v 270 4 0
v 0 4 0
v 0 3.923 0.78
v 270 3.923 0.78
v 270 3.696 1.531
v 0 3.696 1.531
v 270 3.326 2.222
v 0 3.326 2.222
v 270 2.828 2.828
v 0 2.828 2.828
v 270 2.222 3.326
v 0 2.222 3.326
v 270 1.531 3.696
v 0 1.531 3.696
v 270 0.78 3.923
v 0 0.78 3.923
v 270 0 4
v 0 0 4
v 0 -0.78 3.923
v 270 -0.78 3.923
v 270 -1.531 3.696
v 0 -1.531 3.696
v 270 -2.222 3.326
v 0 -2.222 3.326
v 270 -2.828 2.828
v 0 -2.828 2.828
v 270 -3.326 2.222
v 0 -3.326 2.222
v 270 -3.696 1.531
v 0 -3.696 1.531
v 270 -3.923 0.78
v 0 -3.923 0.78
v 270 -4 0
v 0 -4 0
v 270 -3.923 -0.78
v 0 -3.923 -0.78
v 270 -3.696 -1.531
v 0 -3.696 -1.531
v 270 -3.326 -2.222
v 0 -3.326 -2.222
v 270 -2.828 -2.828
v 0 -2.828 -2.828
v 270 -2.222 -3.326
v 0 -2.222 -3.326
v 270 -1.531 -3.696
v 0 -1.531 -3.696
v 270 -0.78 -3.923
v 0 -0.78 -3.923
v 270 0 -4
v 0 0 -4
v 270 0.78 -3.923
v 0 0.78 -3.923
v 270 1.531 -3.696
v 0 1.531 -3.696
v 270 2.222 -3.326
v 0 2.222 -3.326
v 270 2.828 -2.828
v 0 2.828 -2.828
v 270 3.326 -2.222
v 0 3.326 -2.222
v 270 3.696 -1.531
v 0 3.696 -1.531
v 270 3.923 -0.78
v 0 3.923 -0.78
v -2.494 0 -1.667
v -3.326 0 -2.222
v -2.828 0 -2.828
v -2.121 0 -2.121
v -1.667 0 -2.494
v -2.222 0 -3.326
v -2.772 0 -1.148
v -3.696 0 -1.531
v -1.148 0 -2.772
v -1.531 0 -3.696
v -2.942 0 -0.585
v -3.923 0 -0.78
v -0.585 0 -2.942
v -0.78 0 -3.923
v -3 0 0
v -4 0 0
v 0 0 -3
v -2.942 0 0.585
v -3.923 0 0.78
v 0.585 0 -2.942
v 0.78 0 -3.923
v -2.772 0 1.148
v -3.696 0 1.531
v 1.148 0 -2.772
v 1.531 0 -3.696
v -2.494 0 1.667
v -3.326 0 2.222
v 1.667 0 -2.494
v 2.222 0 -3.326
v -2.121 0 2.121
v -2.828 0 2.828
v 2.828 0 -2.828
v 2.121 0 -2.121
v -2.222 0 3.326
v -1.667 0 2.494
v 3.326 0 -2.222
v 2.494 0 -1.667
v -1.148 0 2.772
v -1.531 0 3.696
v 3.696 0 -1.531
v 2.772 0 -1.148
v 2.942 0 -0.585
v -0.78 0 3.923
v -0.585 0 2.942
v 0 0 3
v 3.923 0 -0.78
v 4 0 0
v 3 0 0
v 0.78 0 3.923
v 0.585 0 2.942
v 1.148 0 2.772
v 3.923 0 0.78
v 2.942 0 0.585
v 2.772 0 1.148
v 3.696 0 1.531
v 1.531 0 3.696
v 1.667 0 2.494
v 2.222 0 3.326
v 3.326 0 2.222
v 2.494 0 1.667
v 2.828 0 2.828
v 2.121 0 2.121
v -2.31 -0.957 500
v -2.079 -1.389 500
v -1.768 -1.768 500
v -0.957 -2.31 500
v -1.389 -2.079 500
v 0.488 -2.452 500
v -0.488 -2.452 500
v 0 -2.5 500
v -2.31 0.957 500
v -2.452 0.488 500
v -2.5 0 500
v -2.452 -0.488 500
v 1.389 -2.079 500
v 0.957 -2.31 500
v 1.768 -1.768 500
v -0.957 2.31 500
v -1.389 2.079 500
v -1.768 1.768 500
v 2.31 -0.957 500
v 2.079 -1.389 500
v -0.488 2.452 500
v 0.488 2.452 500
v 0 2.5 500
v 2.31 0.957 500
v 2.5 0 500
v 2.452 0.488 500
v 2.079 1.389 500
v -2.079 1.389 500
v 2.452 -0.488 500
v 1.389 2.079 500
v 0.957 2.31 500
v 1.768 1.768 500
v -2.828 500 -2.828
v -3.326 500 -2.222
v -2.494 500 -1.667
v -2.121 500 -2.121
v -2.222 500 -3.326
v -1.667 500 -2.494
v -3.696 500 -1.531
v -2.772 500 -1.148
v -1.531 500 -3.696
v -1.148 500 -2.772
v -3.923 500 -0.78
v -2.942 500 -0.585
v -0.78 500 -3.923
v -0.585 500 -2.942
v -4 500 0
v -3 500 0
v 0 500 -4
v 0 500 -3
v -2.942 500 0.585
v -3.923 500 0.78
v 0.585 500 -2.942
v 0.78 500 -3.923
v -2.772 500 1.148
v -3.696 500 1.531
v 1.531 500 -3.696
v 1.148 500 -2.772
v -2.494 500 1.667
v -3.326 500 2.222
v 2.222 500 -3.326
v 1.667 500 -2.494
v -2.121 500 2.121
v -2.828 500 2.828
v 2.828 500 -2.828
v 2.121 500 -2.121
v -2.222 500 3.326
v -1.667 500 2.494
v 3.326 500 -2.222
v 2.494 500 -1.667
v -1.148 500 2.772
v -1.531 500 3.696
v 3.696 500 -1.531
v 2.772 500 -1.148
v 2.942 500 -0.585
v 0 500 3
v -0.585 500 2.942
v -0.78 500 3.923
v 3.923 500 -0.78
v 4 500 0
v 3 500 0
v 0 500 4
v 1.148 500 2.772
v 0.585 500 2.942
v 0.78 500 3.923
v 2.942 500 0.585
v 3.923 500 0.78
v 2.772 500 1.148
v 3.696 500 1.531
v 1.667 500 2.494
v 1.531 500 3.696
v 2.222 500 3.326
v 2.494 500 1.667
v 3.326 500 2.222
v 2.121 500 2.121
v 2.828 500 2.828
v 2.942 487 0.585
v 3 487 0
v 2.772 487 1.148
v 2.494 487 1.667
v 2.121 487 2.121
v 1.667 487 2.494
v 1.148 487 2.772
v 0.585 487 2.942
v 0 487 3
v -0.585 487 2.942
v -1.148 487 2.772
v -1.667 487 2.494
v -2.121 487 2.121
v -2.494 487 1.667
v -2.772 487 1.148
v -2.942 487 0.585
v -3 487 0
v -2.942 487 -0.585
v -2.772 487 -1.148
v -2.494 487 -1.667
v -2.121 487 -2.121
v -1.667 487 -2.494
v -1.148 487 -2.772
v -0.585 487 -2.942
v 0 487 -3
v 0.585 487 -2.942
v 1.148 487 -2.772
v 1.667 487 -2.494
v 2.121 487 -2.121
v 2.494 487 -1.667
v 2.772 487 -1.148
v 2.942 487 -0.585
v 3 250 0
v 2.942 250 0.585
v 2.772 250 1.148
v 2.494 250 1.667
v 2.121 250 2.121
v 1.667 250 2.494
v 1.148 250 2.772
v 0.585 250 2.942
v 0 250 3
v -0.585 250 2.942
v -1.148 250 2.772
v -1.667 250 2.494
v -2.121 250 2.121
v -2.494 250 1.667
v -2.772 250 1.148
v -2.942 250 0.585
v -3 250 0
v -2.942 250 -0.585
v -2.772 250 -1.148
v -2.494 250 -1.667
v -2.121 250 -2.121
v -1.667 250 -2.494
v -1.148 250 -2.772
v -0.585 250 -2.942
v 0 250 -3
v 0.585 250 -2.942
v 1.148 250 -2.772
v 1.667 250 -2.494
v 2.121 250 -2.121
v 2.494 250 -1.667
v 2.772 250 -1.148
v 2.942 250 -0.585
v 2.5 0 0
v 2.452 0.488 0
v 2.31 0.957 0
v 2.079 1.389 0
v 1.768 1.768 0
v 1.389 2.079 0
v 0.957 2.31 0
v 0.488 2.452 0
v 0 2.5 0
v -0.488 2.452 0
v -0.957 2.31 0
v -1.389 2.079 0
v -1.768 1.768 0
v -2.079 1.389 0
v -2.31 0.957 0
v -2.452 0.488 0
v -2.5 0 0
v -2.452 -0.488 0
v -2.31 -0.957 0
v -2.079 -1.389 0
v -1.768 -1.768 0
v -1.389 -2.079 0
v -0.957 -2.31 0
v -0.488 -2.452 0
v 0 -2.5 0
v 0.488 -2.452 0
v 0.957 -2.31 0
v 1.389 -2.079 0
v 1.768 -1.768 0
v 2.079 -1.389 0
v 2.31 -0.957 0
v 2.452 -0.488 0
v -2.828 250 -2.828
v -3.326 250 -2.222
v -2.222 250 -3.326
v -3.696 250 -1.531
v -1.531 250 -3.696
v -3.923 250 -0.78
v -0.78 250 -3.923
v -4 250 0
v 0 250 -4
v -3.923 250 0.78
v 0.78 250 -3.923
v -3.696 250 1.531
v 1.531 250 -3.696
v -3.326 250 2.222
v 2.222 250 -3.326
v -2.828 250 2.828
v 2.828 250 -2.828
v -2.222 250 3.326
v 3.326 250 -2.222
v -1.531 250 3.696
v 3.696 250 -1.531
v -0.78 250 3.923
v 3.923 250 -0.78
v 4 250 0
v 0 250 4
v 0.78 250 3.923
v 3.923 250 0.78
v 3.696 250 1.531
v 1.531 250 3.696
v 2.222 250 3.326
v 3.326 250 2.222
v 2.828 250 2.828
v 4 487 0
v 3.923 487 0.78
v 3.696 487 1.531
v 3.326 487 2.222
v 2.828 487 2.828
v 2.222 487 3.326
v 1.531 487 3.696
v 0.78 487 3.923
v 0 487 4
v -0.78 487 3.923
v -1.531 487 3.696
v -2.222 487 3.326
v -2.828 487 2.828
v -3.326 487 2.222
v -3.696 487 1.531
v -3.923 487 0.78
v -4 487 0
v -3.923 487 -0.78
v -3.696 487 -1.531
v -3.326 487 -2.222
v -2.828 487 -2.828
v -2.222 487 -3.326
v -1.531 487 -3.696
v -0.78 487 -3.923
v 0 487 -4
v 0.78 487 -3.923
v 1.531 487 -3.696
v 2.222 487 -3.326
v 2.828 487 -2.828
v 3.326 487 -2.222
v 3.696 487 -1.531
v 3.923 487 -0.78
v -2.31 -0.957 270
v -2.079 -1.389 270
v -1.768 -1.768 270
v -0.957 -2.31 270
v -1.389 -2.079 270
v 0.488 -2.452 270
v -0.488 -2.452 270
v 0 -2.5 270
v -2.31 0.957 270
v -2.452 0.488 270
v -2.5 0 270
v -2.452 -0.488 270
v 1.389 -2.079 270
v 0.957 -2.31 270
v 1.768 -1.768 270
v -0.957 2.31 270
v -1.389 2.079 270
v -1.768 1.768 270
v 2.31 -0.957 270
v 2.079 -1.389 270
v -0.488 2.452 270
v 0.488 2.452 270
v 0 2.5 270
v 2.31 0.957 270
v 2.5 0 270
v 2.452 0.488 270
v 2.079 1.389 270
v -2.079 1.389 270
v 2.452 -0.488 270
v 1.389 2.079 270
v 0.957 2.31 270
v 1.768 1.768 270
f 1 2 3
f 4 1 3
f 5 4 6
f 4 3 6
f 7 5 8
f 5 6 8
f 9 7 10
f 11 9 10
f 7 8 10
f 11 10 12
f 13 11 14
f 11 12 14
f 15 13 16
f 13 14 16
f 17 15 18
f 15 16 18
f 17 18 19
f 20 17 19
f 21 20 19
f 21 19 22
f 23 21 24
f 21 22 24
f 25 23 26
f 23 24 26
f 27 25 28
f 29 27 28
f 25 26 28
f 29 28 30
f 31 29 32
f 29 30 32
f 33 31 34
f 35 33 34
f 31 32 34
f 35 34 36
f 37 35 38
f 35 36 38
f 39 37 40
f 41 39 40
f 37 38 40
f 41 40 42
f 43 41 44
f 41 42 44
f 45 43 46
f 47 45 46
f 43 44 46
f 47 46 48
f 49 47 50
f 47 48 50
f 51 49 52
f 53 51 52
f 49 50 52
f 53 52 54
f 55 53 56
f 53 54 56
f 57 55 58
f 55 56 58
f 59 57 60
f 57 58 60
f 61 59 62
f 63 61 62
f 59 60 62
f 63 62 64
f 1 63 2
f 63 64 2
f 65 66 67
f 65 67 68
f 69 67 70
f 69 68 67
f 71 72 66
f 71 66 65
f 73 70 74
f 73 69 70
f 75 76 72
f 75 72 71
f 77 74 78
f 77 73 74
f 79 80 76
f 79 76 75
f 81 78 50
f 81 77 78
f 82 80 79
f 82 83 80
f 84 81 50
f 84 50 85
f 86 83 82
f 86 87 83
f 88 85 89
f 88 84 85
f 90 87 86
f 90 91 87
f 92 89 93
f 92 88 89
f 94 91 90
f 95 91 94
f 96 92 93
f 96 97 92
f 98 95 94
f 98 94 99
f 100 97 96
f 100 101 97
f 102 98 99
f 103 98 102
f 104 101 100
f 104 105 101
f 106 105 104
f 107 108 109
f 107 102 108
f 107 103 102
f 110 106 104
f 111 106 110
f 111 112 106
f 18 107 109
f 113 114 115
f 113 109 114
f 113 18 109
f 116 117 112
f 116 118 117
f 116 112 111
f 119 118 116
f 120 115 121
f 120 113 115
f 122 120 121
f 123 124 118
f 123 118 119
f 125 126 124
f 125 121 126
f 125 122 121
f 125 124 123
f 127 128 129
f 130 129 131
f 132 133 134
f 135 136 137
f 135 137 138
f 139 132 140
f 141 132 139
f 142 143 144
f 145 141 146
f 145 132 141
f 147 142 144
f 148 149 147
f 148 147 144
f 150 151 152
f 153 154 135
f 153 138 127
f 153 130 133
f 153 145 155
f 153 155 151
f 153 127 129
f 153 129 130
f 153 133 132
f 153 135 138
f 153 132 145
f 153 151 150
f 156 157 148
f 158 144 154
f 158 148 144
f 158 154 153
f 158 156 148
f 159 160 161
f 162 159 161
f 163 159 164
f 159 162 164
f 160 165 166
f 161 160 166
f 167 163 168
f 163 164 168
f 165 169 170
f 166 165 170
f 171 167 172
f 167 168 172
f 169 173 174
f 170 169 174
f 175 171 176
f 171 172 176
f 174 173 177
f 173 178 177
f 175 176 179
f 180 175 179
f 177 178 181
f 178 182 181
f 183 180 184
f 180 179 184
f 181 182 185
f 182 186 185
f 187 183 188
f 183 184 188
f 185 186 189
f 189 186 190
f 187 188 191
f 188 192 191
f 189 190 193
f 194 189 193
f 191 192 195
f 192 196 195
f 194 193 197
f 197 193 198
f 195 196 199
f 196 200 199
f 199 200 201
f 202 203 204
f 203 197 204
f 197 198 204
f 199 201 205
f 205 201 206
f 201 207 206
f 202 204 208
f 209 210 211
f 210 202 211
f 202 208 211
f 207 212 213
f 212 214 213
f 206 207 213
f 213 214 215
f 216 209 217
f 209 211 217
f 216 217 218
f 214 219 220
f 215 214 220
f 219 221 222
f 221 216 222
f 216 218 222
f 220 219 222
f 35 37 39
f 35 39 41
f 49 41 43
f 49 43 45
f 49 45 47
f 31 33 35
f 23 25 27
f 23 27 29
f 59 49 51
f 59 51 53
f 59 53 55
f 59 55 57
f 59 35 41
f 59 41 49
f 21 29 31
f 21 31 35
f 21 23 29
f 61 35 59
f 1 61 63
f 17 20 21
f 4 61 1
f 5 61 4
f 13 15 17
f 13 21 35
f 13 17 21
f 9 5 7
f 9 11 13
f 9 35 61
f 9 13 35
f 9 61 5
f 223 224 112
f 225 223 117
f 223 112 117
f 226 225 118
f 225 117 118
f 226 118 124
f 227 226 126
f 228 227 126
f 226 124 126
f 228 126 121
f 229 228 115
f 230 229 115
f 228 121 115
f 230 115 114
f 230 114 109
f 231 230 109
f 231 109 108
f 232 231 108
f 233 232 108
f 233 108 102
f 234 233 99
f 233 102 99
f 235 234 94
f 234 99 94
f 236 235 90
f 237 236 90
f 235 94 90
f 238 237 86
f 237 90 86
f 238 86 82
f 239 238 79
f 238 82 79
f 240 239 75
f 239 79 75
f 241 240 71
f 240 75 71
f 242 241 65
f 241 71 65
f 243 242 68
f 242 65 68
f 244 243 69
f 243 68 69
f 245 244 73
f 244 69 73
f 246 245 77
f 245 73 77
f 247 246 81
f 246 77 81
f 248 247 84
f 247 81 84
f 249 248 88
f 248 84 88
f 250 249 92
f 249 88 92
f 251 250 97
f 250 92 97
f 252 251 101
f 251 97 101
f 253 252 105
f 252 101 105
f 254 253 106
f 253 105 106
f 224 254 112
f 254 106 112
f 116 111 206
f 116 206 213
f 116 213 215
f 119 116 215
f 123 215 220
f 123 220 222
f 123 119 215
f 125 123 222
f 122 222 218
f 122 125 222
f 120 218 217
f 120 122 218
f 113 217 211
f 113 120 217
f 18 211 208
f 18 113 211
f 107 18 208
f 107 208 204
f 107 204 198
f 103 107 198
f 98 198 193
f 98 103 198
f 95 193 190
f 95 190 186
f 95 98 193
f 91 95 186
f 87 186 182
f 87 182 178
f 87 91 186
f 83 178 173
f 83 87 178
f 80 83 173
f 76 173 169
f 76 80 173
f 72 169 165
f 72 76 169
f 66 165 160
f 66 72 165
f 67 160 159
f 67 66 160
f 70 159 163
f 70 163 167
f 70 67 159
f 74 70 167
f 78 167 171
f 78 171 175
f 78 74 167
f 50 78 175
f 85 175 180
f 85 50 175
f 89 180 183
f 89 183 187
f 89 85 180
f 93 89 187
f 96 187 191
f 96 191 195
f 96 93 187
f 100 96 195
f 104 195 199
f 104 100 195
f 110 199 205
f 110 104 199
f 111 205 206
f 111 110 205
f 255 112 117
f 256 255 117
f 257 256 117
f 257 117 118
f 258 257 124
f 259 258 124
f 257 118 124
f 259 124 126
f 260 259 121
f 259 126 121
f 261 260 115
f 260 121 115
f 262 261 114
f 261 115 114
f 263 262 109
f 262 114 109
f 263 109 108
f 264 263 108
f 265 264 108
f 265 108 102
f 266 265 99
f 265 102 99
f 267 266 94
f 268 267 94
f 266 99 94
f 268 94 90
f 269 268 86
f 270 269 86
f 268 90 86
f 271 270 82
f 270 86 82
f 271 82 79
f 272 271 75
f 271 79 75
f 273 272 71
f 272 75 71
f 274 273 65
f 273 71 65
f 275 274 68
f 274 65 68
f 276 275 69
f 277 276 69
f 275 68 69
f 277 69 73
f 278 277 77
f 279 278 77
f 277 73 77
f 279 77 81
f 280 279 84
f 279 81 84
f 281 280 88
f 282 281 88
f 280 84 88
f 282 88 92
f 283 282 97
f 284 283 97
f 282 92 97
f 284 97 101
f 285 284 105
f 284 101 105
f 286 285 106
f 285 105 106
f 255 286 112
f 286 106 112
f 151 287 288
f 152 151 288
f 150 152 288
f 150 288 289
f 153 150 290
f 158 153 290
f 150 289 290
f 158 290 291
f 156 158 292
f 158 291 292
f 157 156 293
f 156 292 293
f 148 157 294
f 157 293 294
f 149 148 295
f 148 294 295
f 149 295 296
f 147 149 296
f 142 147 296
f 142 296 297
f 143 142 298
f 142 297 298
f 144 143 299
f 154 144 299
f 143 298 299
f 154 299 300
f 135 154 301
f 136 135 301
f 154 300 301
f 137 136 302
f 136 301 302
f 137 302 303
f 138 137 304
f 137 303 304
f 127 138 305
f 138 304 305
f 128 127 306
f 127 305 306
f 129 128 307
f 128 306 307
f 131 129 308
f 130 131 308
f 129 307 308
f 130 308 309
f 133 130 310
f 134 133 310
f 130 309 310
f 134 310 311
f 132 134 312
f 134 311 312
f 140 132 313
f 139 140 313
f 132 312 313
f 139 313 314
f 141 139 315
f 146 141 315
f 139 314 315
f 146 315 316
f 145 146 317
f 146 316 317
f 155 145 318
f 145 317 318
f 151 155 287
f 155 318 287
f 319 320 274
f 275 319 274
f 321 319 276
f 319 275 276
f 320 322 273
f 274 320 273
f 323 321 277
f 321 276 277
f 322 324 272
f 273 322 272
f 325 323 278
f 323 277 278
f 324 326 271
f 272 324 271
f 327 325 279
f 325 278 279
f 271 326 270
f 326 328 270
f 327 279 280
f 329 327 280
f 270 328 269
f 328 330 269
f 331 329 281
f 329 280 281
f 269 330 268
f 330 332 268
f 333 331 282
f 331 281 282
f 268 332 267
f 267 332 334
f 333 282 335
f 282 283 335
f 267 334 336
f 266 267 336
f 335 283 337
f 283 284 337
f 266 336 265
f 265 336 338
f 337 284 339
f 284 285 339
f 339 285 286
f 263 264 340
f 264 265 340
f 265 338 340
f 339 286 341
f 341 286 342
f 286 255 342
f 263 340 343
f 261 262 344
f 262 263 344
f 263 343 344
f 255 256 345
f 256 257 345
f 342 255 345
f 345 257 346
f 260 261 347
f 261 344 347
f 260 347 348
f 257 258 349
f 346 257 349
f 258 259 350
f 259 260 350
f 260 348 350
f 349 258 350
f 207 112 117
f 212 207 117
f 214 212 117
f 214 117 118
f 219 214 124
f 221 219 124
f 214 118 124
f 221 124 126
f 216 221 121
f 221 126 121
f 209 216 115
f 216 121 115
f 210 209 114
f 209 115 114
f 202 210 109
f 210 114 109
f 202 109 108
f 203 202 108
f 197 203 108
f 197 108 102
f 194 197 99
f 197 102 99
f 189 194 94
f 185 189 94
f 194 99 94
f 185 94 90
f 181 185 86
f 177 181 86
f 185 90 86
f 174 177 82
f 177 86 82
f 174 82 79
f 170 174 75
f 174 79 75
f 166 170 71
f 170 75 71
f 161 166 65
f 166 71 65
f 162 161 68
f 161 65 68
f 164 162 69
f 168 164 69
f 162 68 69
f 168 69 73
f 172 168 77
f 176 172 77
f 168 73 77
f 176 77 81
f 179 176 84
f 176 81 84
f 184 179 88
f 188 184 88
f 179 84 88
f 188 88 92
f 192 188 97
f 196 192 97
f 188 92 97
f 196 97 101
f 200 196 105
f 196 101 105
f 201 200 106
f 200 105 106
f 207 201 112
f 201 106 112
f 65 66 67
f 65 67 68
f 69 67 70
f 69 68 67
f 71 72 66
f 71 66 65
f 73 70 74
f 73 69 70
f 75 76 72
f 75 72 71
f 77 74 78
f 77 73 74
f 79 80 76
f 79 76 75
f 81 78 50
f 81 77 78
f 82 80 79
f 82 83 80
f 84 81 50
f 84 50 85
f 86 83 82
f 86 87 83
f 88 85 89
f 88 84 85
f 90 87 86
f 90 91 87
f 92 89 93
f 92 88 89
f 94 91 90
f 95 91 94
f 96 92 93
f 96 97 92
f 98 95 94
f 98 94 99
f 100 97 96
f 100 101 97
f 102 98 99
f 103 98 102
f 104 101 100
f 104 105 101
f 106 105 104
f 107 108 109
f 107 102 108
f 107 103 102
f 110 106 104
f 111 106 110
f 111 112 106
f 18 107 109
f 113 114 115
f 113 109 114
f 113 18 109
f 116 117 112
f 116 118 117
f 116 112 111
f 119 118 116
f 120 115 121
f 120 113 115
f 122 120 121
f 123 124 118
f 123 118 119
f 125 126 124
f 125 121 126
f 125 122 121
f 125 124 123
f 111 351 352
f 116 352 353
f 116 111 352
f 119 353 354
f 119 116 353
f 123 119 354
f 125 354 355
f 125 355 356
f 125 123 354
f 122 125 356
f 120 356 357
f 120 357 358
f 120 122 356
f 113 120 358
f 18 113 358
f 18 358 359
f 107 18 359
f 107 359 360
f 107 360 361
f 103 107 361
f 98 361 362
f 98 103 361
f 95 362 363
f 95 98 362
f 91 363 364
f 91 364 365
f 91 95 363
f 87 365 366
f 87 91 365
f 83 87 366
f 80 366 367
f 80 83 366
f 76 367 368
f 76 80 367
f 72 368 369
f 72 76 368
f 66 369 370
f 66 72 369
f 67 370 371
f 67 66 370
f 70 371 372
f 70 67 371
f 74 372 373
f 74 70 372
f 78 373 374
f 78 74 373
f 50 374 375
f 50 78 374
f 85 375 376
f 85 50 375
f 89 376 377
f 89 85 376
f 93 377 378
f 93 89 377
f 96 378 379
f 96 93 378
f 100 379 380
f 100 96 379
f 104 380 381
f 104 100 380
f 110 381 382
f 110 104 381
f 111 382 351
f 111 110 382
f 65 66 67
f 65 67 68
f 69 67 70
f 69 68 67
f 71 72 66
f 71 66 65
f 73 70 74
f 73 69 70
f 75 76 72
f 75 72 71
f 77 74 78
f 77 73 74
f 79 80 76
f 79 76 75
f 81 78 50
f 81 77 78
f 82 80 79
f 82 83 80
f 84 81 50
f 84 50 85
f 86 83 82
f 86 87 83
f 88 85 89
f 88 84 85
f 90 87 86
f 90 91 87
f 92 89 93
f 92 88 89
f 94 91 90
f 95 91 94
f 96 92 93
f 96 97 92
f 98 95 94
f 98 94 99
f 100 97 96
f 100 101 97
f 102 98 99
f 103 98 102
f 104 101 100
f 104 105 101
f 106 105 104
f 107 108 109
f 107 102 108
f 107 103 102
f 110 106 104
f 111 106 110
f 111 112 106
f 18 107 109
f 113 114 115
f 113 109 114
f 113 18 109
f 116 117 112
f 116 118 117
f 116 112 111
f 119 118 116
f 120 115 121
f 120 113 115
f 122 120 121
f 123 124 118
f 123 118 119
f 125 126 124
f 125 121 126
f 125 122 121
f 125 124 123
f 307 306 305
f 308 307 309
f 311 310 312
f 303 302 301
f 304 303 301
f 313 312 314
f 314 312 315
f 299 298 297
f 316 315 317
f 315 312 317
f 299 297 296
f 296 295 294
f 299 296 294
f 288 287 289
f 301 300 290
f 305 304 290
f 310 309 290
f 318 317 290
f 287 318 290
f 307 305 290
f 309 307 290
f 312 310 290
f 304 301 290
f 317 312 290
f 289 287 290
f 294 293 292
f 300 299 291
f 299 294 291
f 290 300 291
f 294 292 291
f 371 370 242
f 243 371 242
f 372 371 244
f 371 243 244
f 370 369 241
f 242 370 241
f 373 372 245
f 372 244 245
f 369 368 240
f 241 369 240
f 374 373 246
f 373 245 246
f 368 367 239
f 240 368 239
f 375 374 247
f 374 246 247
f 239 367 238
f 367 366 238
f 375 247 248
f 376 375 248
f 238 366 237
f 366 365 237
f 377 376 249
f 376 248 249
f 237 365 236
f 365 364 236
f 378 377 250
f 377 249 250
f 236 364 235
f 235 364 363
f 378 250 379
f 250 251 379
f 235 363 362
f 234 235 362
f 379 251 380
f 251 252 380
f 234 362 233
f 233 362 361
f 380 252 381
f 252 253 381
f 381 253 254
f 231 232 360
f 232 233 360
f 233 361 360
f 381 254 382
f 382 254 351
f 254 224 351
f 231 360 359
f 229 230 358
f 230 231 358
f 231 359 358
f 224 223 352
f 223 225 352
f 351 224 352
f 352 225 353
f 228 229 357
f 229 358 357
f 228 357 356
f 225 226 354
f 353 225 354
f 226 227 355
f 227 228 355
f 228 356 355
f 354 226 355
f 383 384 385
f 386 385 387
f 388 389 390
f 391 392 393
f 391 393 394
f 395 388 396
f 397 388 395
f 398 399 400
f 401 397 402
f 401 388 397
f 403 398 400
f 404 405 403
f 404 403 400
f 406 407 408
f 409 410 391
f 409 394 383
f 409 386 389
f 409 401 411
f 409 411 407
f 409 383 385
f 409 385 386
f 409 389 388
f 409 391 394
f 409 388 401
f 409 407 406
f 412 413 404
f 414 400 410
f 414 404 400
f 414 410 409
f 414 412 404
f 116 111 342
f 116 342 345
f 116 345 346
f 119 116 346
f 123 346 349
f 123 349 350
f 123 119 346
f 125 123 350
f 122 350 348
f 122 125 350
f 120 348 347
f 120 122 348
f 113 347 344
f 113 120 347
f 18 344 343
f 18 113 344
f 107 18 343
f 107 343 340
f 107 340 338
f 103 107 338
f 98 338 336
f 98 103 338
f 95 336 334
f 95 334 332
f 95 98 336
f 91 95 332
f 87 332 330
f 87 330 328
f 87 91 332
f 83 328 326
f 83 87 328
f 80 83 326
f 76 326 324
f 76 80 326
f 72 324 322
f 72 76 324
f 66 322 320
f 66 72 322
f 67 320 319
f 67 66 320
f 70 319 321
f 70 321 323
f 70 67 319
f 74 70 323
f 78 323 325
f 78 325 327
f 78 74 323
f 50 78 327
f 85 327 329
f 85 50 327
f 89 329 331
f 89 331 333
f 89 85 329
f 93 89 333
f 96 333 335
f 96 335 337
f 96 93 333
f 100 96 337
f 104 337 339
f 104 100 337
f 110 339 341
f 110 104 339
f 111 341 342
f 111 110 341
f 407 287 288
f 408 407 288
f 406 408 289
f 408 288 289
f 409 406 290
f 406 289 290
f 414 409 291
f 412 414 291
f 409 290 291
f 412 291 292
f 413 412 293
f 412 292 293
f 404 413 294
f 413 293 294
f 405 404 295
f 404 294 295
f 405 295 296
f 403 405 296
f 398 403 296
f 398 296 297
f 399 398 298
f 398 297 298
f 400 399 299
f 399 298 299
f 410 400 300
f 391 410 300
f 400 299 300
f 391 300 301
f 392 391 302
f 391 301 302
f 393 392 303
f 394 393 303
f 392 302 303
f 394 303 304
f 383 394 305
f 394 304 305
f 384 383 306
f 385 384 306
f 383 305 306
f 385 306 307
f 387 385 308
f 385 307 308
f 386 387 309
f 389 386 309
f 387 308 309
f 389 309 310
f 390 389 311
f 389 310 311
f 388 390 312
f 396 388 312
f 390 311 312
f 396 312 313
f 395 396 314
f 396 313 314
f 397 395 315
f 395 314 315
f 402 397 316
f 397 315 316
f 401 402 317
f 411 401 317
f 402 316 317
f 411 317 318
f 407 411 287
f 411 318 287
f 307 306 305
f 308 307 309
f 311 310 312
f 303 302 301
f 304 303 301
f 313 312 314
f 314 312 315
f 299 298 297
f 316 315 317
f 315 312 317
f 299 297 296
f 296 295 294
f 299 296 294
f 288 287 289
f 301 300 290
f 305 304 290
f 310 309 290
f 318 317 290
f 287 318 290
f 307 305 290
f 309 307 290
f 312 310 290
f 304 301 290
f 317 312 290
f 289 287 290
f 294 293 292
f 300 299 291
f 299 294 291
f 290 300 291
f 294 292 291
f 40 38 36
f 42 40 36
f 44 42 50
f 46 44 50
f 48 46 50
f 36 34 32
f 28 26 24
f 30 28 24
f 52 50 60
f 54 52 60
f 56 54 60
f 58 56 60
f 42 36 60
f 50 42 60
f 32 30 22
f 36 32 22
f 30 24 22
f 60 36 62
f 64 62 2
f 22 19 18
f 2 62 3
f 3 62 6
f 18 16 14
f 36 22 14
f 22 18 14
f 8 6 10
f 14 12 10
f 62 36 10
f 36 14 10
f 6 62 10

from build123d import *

# Parameters (mm, degrees)
F0_R     = 4
F0_R_2   = 3
F1_DEPTH = 500
F2_DEPTH = 487
F3_R     = 2.5
F4_DEPTH = 500
F5_DEPTH = 250
F6_R     = 4
F7_DEPTH = 270
F8_DEPTH = 270


with BuildPart() as f1:
    # F0 (on Front) → F1 (new body)
    with BuildSketch(Plane.XZ):
        Circle(F0_R)
        Circle(F0_R_2, mode=Mode.SUBTRACT)
    extrude(amount=-F1_DEPTH)


with BuildPart() as f2:
    # F0 (on Front) → F2 (new body)
    with BuildSketch(Plane.XZ):
        Circle(F0_R)
        Circle(F0_R_2, mode=Mode.SUBTRACT)
    extrude(amount=-F2_DEPTH)


with BuildPart() as f4:
    # F3 (on Top) → F4 (new body)
    with BuildSketch(Plane.XY):
        Circle(F3_R)
    extrude(amount=F4_DEPTH)


with BuildPart() as f5:
    # F0 (on Front) → F5 (new body)
    with BuildSketch(Plane.XZ):
        Circle(F0_R)
        Circle(F0_R_2, mode=Mode.SUBTRACT)
    extrude(amount=-F5_DEPTH)


with BuildPart() as f7:
    # F6 (on Right) → F7 (new body)
    with BuildSketch(Plane.YZ):
        Circle(F6_R)
    extrude(amount=F7_DEPTH)


with BuildPart() as f8:
    # F3 (on Top) → F8 (new body)
    with BuildSketch(Plane.XY):
        Circle(F3_R)
    extrude(amount=F8_DEPTH)


solid = Compound([f1.part, f2.part, f4.part, f5.part, f7.part, f8.part])
